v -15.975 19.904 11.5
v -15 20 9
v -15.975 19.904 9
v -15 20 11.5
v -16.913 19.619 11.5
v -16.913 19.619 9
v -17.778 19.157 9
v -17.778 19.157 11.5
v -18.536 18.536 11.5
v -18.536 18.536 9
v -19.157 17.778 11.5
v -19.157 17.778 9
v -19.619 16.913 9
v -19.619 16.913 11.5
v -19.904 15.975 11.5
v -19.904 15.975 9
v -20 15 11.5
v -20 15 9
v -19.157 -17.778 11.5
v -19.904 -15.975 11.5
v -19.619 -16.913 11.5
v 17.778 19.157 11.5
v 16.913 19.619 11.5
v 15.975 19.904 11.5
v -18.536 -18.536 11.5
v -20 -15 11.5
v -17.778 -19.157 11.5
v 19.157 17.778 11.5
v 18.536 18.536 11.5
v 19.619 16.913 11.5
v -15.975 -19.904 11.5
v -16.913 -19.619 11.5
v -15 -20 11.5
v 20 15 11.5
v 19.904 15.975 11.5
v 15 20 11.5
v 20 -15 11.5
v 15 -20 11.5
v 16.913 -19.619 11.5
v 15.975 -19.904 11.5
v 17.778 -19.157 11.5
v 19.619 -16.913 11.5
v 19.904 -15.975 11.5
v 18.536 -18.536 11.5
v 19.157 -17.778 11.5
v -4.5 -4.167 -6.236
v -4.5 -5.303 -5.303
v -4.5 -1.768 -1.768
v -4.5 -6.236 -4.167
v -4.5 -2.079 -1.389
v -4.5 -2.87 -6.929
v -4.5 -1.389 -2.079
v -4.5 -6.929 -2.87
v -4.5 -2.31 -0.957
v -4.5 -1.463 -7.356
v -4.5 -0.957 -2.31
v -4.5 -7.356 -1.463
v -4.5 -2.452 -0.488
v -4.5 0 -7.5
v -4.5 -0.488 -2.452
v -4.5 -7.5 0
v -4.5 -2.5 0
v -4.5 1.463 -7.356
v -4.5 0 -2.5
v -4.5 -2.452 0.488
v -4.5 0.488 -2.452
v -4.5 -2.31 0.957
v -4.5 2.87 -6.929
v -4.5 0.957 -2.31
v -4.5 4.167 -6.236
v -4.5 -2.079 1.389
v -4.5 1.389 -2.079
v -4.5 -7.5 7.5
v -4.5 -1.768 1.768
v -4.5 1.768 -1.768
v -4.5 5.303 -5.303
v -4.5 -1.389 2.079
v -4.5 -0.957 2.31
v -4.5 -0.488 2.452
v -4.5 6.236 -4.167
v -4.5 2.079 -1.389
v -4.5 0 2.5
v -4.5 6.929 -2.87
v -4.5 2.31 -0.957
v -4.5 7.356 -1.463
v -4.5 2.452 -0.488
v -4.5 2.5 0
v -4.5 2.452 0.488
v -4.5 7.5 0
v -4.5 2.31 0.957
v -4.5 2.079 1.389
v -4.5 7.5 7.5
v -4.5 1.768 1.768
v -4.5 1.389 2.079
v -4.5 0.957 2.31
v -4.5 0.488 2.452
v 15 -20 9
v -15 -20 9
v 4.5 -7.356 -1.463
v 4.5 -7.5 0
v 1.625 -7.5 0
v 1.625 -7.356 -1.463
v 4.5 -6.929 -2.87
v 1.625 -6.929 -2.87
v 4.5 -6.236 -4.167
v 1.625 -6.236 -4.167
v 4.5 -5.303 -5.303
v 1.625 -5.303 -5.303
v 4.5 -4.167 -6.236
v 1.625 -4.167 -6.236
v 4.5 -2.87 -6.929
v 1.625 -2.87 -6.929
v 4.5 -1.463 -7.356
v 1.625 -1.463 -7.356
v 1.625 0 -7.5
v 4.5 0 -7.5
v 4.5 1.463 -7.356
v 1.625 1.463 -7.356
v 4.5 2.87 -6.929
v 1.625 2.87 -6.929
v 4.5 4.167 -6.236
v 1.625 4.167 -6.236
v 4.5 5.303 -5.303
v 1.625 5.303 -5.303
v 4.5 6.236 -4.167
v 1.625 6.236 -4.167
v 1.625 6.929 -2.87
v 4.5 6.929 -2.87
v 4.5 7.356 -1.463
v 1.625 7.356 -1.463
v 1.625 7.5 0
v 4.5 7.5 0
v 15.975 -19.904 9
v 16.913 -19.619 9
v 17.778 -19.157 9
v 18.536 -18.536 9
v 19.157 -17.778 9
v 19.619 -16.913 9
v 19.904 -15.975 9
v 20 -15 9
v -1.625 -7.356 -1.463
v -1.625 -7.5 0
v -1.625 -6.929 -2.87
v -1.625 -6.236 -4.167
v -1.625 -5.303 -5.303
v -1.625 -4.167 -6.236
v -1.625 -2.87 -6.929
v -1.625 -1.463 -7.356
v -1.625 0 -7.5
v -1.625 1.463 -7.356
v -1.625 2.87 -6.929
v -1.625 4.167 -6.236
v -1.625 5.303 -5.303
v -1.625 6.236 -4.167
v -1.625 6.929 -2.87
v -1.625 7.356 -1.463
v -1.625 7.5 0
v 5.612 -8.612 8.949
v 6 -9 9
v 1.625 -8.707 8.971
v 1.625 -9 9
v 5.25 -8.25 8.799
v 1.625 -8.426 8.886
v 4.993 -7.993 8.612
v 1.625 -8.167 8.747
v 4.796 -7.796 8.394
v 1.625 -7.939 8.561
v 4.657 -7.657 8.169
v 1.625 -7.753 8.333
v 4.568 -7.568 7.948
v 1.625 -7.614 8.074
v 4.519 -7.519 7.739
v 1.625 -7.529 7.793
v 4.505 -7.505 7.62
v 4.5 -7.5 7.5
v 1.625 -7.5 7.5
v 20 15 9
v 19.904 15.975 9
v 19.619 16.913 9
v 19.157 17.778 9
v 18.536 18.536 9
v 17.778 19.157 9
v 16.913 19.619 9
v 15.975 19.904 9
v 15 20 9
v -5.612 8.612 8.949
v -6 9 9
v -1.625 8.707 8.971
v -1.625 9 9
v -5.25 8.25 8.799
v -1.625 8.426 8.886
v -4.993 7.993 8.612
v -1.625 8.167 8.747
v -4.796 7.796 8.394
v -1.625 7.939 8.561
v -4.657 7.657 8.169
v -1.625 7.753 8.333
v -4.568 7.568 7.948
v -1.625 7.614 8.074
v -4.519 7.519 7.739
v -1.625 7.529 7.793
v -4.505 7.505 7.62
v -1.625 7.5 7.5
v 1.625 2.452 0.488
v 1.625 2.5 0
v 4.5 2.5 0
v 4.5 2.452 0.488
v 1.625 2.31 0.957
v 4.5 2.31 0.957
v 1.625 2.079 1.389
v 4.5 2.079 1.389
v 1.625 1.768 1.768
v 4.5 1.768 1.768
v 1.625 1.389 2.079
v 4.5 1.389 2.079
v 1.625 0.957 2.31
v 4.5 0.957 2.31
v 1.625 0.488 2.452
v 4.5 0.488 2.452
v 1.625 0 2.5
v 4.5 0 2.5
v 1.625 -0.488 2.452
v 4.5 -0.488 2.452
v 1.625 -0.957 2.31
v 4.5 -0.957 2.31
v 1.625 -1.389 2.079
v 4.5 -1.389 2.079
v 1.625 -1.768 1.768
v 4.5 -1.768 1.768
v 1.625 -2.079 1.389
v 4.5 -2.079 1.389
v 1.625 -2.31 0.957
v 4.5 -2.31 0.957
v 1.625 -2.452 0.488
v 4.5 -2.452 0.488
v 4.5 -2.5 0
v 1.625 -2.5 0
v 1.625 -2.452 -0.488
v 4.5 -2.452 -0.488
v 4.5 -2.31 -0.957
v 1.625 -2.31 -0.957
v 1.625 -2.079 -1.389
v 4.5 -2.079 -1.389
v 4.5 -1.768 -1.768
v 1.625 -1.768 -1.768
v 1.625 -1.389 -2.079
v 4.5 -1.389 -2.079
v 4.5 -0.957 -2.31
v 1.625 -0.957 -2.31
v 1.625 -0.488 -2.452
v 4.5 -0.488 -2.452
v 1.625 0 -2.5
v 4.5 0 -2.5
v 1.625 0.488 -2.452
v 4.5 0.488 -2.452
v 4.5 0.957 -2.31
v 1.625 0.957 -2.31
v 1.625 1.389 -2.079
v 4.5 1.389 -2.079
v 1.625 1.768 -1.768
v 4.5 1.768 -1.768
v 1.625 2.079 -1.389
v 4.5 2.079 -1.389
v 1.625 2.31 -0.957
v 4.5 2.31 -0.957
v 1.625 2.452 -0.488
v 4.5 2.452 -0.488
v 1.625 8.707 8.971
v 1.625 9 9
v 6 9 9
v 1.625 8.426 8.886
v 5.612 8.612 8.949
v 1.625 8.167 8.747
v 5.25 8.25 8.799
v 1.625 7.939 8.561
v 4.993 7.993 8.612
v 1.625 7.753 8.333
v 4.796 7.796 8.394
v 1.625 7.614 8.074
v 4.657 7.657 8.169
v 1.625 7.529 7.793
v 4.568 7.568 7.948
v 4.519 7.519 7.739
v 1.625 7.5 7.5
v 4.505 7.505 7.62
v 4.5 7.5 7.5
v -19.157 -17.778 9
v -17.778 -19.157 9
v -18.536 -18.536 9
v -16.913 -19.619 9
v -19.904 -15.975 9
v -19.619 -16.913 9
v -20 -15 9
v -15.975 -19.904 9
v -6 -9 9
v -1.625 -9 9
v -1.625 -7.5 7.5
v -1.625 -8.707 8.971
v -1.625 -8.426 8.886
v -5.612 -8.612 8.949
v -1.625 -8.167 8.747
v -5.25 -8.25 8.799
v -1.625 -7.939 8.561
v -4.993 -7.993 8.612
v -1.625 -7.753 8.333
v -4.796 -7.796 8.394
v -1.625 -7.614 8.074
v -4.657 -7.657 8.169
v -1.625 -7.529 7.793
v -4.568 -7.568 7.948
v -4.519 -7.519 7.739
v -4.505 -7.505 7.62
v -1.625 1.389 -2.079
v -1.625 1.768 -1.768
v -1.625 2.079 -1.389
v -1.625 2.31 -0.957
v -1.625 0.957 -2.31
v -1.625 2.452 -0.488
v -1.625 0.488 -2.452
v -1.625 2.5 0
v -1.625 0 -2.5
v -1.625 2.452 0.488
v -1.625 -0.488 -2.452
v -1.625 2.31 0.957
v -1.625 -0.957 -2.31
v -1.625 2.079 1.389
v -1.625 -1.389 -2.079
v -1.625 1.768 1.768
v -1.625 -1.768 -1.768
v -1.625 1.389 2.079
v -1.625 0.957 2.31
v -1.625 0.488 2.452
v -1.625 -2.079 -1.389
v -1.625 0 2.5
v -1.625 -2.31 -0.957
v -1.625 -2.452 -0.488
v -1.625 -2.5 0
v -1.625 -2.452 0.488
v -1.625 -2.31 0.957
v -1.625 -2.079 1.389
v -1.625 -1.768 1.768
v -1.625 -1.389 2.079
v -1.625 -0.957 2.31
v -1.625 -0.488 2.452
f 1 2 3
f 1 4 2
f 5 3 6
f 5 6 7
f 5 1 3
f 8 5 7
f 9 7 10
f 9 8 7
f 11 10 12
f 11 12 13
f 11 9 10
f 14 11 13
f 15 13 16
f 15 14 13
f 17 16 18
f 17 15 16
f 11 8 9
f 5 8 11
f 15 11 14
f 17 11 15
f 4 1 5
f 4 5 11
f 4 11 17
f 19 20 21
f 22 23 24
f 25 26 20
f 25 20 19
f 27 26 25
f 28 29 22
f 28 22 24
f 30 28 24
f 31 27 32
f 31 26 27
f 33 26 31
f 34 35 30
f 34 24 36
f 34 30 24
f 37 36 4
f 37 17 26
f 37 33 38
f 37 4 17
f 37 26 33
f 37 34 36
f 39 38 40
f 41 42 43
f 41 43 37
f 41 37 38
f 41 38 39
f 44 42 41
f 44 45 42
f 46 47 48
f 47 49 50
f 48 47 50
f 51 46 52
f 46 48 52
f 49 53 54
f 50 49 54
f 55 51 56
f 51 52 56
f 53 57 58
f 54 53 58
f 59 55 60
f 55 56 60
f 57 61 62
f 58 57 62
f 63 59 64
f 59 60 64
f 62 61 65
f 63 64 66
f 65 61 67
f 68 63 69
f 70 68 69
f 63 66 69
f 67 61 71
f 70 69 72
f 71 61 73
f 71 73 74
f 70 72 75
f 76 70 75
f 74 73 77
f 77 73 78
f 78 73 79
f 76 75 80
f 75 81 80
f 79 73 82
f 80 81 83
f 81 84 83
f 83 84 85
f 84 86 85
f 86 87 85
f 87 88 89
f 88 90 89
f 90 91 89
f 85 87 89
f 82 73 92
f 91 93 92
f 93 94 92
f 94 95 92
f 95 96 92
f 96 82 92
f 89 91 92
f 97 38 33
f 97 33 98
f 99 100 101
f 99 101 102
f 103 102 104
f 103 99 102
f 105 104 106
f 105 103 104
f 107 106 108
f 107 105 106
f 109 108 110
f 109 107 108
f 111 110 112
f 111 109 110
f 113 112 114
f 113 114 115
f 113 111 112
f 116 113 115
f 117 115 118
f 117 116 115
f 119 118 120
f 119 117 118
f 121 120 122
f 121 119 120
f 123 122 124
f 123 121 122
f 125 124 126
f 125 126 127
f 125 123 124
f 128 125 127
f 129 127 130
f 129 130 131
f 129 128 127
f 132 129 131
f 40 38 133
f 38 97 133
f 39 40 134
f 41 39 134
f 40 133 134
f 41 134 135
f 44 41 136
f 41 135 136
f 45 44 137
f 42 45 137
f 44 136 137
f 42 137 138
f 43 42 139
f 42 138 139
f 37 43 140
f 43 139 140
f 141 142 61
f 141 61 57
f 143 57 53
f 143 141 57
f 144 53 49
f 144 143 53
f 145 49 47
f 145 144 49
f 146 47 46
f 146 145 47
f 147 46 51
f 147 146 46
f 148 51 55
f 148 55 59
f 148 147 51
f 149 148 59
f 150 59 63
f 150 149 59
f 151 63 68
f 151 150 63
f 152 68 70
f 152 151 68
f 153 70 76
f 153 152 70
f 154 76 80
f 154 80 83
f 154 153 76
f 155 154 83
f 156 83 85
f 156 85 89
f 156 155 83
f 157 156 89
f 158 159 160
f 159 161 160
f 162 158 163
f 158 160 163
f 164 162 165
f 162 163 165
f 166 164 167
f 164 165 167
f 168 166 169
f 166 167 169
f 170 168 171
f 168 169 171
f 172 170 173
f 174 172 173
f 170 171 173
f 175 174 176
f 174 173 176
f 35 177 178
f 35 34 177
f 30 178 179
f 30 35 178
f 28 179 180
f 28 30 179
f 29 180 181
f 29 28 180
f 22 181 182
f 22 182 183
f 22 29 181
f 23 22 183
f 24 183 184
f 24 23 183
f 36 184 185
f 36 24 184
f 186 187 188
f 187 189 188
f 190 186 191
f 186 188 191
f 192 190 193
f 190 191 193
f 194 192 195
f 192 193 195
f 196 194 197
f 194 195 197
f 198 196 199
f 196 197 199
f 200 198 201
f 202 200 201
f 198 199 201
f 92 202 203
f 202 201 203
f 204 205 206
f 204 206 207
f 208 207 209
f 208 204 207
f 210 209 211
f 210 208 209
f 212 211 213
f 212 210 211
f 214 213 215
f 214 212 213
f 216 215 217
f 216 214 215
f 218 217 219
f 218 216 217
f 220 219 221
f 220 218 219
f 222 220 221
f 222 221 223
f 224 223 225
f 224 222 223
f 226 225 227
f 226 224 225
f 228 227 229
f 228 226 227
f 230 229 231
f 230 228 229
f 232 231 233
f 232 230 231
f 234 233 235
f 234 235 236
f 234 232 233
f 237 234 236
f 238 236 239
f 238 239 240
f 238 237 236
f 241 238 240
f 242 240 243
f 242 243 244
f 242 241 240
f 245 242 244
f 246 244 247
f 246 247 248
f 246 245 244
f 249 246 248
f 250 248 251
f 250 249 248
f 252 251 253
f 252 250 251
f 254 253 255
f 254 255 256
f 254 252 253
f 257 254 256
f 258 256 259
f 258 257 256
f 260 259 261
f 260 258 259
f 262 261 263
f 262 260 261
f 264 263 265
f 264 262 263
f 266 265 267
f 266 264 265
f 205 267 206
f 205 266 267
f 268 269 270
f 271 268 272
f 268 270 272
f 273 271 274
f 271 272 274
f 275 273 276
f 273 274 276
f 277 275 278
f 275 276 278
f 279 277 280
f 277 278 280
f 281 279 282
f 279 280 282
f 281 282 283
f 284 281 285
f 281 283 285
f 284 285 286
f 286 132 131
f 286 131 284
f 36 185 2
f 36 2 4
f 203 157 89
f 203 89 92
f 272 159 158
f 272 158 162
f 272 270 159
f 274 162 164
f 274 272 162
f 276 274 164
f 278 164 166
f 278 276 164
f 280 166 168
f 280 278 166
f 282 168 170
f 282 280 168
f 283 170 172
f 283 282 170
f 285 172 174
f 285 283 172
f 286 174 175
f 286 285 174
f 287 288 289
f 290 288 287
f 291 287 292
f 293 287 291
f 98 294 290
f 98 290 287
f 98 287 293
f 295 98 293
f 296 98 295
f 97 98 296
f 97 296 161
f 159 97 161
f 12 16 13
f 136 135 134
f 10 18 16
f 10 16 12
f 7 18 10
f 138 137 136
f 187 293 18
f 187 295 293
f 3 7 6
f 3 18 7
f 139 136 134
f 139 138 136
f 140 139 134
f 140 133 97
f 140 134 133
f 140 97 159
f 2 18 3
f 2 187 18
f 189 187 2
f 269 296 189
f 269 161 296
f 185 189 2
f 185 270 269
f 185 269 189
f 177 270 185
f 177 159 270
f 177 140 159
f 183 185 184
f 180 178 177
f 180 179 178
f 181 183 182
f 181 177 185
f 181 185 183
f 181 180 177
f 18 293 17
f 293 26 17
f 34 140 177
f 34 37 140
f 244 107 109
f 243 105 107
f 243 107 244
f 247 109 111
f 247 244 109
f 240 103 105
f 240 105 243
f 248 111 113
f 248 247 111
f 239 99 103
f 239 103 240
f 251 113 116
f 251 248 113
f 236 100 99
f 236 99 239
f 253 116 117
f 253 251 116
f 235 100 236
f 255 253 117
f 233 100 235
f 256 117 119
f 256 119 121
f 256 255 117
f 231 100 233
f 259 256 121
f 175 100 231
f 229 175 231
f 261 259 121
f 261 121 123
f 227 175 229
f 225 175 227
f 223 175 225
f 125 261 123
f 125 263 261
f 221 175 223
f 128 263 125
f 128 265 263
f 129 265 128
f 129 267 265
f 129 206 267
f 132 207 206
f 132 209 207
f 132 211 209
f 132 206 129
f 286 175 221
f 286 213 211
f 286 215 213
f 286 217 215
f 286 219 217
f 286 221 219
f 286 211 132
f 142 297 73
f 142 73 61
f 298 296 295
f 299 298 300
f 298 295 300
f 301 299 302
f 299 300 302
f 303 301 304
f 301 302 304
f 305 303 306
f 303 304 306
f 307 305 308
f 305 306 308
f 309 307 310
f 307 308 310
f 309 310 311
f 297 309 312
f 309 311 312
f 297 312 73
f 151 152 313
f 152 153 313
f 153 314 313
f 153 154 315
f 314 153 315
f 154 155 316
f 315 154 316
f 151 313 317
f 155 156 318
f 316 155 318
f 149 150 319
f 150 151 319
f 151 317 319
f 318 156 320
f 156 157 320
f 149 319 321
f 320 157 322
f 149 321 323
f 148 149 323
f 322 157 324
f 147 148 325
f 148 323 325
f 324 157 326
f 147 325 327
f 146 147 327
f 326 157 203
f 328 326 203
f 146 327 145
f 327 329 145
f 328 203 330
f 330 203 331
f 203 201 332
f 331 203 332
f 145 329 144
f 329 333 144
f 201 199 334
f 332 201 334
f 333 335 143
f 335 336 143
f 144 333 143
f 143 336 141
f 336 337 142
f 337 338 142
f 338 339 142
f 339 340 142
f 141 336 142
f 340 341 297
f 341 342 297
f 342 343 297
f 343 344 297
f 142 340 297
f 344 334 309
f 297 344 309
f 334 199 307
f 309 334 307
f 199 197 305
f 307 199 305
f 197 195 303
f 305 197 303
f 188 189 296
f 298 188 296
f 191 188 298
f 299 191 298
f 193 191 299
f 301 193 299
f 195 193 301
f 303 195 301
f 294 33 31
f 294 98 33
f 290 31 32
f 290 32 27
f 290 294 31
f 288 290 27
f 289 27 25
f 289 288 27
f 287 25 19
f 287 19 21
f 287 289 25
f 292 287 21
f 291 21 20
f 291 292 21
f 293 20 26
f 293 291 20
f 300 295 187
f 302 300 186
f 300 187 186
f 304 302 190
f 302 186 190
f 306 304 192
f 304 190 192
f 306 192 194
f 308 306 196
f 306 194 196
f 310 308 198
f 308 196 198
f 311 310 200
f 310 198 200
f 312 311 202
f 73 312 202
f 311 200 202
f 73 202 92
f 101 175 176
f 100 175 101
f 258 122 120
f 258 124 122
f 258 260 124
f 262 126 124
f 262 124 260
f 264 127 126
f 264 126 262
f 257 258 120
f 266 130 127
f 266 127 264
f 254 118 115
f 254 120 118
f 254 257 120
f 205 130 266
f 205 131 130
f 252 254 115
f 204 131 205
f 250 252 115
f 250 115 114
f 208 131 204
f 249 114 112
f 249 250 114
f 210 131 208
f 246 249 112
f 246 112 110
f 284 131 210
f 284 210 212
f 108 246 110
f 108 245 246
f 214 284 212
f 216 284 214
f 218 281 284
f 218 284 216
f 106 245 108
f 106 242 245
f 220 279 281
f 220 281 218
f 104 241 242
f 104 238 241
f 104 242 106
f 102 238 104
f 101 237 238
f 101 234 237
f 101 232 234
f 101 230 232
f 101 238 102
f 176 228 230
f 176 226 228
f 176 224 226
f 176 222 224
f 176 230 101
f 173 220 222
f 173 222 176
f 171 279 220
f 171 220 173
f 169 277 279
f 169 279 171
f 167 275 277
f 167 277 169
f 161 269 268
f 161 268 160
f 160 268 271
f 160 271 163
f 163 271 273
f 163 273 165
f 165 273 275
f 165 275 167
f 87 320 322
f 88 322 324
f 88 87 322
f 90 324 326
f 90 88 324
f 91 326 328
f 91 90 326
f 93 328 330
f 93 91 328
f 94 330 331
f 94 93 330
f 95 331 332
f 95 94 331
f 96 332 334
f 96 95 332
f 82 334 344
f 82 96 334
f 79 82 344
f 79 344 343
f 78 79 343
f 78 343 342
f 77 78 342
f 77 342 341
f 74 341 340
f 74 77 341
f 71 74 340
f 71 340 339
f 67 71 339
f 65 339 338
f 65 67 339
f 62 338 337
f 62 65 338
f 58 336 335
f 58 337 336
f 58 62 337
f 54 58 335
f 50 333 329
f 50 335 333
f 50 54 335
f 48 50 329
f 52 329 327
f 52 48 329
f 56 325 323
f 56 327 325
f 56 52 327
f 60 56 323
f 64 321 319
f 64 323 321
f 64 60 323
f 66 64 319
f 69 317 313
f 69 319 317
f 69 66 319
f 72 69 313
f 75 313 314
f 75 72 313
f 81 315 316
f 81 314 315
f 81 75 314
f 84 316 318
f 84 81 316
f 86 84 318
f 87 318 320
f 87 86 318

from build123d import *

# Parameters (mm, degrees)
F0_R     = 2.5
F1_DEPTH = 4.5
F2_DEPTH = 20
F3_W     = 3.25
F3_H     = 20
F4_DEPTH = 25
F5_R     = 1.5
F6_R     = 5


with BuildPart() as f1:
    # F0 (on Right) → F1 (new body, symmetric)
    with BuildSketch(Plane.YZ):
        with BuildLine():
            Line((-7.5, 9), (-7.5, 0))
            ThreePointArc((-7.5, 0), (0, -7.5), (7.5, 0))
            Line((7.5, 0), (7.5, 9))
            Line((7.5, 9), (-7.5, 9))
        make_face()
        Circle(F0_R, mode=Mode.SUBTRACT)
        Polygon((-20, 9), (-7.5, 9), (7.5, 9), (20, 9), (20, 11.5), (-20, 11.5), align=None)
    extrude(amount=F1_DEPTH, both=True)

    # F0 (on Right) → F2 (join, symmetric)
    with BuildSketch(Plane.YZ):
        Polygon((-20, 9), (-7.5, 9), (7.5, 9), (20, 9), (20, 11.5), (-20, 11.5), align=None)
    extrude(amount=F2_DEPTH, both=True)

    # F3 (on face) → F4 (cut)
    with BuildSketch(Plane(origin=(0, 0, 9), x_dir=(1, 0, 0), z_dir=(0, 0, -1))):
        Rectangle(F3_W, F3_H)
    extrude(amount=F4_DEPTH, mode=Mode.SUBTRACT)

    # F5
    f5_edges = [f1.edges().sort_by_distance(p)[0] for p in [
        (-4.5, 0, 9),
        (4.5, 0, 9),
        (-3.0625, 7.5, 9),
        (3.0625, 7.5, 9),
        (-3.0625, -7.5, 9),
        (3.0625, -7.5, 9),
    ]]
    fillet(f5_edges, radius=F5_R)

    # F6
    f6_edges = [f1.edges().sort_by_distance(p)[0] for p in [
        (20, -20, 10.25),
        (-20, -20, 10.25),
        (20, 20, 10.25),
        (-20, 20, 10.25),
    ]]
    fillet(f6_edges, radius=F6_R)


solid = f1.part
